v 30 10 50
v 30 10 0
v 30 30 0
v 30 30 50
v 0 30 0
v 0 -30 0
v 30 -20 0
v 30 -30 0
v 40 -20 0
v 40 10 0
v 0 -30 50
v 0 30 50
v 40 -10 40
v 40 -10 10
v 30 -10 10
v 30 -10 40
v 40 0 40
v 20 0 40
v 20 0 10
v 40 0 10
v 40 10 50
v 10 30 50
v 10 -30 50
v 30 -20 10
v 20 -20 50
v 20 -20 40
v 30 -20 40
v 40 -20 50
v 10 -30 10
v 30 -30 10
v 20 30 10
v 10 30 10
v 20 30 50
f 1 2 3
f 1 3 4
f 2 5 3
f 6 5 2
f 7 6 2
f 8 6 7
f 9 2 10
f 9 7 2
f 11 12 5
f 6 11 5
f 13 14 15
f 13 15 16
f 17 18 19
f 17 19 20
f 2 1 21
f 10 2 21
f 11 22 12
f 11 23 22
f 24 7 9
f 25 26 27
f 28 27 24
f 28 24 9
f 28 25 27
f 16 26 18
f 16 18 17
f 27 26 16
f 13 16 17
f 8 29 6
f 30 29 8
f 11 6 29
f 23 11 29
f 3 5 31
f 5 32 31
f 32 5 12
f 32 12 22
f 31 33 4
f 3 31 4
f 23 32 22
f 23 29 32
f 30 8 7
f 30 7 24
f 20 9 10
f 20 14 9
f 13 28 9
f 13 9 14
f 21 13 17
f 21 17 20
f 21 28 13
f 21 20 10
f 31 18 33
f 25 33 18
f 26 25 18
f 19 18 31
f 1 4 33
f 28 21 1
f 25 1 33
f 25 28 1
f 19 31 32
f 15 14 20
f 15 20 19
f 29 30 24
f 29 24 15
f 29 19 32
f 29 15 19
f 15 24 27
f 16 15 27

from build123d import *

# Parameters (mm, degrees)
F1_DEPTH = 30
F2_W     = 10
F2_H     = 30
F3_DEPTH = 50
F4_W     = 10
F4_H     = 10
F5_DEPTH = 10
F6_W     = 10
F6_H     = 30
F7_DEPTH = 30
F8_W     = 10
F8_H     = 30
F9_DEPTH = 10


with BuildPart() as f1:
    # F0 (on Front) → F1 (new body, symmetric)
    with BuildSketch(Plane.XZ):
        Polygon((0, 50), (0, 0), (30, 0), (30, 50), (20, 50), (20, 10), (10, 10), (10, 50), align=None)
    extrude(amount=F1_DEPTH, both=True)

    # F2 (on face) → F3 (join, through all)
    with BuildSketch(Plane.XY.offset(50)):
        with Locations((35, -5)):
            Rectangle(F2_W, F2_H)
    extrude(amount=-F3_DEPTH)

    # F4 (on face) → F5 (cut)
    with BuildSketch(Plane.XZ.offset(30)):
        with Locations((25, 45)):
            Rectangle(F4_W, F4_H)
        Polygon((40, 50), (30, 50), (30, 40), (30, 0), (40, 0), align=None)
    extrude(amount=-F5_DEPTH, mode=Mode.SUBTRACT)

    # F6 (on face) → F7 (cut)
    with BuildSketch(Plane.XZ.offset(30)):
        with Locations((25, 25)):
            Rectangle(F6_W, F6_H)
    extrude(amount=-F7_DEPTH, mode=Mode.SUBTRACT)

    # F8 (on face) → F9 (cut, through all)
    with BuildSketch(Plane.YZ.offset(40)):
        with Locations((-5, 25)):
            Rectangle(F8_W, F8_H)
    extrude(amount=-F9_DEPTH, mode=Mode.SUBTRACT)


solid = f1.part
